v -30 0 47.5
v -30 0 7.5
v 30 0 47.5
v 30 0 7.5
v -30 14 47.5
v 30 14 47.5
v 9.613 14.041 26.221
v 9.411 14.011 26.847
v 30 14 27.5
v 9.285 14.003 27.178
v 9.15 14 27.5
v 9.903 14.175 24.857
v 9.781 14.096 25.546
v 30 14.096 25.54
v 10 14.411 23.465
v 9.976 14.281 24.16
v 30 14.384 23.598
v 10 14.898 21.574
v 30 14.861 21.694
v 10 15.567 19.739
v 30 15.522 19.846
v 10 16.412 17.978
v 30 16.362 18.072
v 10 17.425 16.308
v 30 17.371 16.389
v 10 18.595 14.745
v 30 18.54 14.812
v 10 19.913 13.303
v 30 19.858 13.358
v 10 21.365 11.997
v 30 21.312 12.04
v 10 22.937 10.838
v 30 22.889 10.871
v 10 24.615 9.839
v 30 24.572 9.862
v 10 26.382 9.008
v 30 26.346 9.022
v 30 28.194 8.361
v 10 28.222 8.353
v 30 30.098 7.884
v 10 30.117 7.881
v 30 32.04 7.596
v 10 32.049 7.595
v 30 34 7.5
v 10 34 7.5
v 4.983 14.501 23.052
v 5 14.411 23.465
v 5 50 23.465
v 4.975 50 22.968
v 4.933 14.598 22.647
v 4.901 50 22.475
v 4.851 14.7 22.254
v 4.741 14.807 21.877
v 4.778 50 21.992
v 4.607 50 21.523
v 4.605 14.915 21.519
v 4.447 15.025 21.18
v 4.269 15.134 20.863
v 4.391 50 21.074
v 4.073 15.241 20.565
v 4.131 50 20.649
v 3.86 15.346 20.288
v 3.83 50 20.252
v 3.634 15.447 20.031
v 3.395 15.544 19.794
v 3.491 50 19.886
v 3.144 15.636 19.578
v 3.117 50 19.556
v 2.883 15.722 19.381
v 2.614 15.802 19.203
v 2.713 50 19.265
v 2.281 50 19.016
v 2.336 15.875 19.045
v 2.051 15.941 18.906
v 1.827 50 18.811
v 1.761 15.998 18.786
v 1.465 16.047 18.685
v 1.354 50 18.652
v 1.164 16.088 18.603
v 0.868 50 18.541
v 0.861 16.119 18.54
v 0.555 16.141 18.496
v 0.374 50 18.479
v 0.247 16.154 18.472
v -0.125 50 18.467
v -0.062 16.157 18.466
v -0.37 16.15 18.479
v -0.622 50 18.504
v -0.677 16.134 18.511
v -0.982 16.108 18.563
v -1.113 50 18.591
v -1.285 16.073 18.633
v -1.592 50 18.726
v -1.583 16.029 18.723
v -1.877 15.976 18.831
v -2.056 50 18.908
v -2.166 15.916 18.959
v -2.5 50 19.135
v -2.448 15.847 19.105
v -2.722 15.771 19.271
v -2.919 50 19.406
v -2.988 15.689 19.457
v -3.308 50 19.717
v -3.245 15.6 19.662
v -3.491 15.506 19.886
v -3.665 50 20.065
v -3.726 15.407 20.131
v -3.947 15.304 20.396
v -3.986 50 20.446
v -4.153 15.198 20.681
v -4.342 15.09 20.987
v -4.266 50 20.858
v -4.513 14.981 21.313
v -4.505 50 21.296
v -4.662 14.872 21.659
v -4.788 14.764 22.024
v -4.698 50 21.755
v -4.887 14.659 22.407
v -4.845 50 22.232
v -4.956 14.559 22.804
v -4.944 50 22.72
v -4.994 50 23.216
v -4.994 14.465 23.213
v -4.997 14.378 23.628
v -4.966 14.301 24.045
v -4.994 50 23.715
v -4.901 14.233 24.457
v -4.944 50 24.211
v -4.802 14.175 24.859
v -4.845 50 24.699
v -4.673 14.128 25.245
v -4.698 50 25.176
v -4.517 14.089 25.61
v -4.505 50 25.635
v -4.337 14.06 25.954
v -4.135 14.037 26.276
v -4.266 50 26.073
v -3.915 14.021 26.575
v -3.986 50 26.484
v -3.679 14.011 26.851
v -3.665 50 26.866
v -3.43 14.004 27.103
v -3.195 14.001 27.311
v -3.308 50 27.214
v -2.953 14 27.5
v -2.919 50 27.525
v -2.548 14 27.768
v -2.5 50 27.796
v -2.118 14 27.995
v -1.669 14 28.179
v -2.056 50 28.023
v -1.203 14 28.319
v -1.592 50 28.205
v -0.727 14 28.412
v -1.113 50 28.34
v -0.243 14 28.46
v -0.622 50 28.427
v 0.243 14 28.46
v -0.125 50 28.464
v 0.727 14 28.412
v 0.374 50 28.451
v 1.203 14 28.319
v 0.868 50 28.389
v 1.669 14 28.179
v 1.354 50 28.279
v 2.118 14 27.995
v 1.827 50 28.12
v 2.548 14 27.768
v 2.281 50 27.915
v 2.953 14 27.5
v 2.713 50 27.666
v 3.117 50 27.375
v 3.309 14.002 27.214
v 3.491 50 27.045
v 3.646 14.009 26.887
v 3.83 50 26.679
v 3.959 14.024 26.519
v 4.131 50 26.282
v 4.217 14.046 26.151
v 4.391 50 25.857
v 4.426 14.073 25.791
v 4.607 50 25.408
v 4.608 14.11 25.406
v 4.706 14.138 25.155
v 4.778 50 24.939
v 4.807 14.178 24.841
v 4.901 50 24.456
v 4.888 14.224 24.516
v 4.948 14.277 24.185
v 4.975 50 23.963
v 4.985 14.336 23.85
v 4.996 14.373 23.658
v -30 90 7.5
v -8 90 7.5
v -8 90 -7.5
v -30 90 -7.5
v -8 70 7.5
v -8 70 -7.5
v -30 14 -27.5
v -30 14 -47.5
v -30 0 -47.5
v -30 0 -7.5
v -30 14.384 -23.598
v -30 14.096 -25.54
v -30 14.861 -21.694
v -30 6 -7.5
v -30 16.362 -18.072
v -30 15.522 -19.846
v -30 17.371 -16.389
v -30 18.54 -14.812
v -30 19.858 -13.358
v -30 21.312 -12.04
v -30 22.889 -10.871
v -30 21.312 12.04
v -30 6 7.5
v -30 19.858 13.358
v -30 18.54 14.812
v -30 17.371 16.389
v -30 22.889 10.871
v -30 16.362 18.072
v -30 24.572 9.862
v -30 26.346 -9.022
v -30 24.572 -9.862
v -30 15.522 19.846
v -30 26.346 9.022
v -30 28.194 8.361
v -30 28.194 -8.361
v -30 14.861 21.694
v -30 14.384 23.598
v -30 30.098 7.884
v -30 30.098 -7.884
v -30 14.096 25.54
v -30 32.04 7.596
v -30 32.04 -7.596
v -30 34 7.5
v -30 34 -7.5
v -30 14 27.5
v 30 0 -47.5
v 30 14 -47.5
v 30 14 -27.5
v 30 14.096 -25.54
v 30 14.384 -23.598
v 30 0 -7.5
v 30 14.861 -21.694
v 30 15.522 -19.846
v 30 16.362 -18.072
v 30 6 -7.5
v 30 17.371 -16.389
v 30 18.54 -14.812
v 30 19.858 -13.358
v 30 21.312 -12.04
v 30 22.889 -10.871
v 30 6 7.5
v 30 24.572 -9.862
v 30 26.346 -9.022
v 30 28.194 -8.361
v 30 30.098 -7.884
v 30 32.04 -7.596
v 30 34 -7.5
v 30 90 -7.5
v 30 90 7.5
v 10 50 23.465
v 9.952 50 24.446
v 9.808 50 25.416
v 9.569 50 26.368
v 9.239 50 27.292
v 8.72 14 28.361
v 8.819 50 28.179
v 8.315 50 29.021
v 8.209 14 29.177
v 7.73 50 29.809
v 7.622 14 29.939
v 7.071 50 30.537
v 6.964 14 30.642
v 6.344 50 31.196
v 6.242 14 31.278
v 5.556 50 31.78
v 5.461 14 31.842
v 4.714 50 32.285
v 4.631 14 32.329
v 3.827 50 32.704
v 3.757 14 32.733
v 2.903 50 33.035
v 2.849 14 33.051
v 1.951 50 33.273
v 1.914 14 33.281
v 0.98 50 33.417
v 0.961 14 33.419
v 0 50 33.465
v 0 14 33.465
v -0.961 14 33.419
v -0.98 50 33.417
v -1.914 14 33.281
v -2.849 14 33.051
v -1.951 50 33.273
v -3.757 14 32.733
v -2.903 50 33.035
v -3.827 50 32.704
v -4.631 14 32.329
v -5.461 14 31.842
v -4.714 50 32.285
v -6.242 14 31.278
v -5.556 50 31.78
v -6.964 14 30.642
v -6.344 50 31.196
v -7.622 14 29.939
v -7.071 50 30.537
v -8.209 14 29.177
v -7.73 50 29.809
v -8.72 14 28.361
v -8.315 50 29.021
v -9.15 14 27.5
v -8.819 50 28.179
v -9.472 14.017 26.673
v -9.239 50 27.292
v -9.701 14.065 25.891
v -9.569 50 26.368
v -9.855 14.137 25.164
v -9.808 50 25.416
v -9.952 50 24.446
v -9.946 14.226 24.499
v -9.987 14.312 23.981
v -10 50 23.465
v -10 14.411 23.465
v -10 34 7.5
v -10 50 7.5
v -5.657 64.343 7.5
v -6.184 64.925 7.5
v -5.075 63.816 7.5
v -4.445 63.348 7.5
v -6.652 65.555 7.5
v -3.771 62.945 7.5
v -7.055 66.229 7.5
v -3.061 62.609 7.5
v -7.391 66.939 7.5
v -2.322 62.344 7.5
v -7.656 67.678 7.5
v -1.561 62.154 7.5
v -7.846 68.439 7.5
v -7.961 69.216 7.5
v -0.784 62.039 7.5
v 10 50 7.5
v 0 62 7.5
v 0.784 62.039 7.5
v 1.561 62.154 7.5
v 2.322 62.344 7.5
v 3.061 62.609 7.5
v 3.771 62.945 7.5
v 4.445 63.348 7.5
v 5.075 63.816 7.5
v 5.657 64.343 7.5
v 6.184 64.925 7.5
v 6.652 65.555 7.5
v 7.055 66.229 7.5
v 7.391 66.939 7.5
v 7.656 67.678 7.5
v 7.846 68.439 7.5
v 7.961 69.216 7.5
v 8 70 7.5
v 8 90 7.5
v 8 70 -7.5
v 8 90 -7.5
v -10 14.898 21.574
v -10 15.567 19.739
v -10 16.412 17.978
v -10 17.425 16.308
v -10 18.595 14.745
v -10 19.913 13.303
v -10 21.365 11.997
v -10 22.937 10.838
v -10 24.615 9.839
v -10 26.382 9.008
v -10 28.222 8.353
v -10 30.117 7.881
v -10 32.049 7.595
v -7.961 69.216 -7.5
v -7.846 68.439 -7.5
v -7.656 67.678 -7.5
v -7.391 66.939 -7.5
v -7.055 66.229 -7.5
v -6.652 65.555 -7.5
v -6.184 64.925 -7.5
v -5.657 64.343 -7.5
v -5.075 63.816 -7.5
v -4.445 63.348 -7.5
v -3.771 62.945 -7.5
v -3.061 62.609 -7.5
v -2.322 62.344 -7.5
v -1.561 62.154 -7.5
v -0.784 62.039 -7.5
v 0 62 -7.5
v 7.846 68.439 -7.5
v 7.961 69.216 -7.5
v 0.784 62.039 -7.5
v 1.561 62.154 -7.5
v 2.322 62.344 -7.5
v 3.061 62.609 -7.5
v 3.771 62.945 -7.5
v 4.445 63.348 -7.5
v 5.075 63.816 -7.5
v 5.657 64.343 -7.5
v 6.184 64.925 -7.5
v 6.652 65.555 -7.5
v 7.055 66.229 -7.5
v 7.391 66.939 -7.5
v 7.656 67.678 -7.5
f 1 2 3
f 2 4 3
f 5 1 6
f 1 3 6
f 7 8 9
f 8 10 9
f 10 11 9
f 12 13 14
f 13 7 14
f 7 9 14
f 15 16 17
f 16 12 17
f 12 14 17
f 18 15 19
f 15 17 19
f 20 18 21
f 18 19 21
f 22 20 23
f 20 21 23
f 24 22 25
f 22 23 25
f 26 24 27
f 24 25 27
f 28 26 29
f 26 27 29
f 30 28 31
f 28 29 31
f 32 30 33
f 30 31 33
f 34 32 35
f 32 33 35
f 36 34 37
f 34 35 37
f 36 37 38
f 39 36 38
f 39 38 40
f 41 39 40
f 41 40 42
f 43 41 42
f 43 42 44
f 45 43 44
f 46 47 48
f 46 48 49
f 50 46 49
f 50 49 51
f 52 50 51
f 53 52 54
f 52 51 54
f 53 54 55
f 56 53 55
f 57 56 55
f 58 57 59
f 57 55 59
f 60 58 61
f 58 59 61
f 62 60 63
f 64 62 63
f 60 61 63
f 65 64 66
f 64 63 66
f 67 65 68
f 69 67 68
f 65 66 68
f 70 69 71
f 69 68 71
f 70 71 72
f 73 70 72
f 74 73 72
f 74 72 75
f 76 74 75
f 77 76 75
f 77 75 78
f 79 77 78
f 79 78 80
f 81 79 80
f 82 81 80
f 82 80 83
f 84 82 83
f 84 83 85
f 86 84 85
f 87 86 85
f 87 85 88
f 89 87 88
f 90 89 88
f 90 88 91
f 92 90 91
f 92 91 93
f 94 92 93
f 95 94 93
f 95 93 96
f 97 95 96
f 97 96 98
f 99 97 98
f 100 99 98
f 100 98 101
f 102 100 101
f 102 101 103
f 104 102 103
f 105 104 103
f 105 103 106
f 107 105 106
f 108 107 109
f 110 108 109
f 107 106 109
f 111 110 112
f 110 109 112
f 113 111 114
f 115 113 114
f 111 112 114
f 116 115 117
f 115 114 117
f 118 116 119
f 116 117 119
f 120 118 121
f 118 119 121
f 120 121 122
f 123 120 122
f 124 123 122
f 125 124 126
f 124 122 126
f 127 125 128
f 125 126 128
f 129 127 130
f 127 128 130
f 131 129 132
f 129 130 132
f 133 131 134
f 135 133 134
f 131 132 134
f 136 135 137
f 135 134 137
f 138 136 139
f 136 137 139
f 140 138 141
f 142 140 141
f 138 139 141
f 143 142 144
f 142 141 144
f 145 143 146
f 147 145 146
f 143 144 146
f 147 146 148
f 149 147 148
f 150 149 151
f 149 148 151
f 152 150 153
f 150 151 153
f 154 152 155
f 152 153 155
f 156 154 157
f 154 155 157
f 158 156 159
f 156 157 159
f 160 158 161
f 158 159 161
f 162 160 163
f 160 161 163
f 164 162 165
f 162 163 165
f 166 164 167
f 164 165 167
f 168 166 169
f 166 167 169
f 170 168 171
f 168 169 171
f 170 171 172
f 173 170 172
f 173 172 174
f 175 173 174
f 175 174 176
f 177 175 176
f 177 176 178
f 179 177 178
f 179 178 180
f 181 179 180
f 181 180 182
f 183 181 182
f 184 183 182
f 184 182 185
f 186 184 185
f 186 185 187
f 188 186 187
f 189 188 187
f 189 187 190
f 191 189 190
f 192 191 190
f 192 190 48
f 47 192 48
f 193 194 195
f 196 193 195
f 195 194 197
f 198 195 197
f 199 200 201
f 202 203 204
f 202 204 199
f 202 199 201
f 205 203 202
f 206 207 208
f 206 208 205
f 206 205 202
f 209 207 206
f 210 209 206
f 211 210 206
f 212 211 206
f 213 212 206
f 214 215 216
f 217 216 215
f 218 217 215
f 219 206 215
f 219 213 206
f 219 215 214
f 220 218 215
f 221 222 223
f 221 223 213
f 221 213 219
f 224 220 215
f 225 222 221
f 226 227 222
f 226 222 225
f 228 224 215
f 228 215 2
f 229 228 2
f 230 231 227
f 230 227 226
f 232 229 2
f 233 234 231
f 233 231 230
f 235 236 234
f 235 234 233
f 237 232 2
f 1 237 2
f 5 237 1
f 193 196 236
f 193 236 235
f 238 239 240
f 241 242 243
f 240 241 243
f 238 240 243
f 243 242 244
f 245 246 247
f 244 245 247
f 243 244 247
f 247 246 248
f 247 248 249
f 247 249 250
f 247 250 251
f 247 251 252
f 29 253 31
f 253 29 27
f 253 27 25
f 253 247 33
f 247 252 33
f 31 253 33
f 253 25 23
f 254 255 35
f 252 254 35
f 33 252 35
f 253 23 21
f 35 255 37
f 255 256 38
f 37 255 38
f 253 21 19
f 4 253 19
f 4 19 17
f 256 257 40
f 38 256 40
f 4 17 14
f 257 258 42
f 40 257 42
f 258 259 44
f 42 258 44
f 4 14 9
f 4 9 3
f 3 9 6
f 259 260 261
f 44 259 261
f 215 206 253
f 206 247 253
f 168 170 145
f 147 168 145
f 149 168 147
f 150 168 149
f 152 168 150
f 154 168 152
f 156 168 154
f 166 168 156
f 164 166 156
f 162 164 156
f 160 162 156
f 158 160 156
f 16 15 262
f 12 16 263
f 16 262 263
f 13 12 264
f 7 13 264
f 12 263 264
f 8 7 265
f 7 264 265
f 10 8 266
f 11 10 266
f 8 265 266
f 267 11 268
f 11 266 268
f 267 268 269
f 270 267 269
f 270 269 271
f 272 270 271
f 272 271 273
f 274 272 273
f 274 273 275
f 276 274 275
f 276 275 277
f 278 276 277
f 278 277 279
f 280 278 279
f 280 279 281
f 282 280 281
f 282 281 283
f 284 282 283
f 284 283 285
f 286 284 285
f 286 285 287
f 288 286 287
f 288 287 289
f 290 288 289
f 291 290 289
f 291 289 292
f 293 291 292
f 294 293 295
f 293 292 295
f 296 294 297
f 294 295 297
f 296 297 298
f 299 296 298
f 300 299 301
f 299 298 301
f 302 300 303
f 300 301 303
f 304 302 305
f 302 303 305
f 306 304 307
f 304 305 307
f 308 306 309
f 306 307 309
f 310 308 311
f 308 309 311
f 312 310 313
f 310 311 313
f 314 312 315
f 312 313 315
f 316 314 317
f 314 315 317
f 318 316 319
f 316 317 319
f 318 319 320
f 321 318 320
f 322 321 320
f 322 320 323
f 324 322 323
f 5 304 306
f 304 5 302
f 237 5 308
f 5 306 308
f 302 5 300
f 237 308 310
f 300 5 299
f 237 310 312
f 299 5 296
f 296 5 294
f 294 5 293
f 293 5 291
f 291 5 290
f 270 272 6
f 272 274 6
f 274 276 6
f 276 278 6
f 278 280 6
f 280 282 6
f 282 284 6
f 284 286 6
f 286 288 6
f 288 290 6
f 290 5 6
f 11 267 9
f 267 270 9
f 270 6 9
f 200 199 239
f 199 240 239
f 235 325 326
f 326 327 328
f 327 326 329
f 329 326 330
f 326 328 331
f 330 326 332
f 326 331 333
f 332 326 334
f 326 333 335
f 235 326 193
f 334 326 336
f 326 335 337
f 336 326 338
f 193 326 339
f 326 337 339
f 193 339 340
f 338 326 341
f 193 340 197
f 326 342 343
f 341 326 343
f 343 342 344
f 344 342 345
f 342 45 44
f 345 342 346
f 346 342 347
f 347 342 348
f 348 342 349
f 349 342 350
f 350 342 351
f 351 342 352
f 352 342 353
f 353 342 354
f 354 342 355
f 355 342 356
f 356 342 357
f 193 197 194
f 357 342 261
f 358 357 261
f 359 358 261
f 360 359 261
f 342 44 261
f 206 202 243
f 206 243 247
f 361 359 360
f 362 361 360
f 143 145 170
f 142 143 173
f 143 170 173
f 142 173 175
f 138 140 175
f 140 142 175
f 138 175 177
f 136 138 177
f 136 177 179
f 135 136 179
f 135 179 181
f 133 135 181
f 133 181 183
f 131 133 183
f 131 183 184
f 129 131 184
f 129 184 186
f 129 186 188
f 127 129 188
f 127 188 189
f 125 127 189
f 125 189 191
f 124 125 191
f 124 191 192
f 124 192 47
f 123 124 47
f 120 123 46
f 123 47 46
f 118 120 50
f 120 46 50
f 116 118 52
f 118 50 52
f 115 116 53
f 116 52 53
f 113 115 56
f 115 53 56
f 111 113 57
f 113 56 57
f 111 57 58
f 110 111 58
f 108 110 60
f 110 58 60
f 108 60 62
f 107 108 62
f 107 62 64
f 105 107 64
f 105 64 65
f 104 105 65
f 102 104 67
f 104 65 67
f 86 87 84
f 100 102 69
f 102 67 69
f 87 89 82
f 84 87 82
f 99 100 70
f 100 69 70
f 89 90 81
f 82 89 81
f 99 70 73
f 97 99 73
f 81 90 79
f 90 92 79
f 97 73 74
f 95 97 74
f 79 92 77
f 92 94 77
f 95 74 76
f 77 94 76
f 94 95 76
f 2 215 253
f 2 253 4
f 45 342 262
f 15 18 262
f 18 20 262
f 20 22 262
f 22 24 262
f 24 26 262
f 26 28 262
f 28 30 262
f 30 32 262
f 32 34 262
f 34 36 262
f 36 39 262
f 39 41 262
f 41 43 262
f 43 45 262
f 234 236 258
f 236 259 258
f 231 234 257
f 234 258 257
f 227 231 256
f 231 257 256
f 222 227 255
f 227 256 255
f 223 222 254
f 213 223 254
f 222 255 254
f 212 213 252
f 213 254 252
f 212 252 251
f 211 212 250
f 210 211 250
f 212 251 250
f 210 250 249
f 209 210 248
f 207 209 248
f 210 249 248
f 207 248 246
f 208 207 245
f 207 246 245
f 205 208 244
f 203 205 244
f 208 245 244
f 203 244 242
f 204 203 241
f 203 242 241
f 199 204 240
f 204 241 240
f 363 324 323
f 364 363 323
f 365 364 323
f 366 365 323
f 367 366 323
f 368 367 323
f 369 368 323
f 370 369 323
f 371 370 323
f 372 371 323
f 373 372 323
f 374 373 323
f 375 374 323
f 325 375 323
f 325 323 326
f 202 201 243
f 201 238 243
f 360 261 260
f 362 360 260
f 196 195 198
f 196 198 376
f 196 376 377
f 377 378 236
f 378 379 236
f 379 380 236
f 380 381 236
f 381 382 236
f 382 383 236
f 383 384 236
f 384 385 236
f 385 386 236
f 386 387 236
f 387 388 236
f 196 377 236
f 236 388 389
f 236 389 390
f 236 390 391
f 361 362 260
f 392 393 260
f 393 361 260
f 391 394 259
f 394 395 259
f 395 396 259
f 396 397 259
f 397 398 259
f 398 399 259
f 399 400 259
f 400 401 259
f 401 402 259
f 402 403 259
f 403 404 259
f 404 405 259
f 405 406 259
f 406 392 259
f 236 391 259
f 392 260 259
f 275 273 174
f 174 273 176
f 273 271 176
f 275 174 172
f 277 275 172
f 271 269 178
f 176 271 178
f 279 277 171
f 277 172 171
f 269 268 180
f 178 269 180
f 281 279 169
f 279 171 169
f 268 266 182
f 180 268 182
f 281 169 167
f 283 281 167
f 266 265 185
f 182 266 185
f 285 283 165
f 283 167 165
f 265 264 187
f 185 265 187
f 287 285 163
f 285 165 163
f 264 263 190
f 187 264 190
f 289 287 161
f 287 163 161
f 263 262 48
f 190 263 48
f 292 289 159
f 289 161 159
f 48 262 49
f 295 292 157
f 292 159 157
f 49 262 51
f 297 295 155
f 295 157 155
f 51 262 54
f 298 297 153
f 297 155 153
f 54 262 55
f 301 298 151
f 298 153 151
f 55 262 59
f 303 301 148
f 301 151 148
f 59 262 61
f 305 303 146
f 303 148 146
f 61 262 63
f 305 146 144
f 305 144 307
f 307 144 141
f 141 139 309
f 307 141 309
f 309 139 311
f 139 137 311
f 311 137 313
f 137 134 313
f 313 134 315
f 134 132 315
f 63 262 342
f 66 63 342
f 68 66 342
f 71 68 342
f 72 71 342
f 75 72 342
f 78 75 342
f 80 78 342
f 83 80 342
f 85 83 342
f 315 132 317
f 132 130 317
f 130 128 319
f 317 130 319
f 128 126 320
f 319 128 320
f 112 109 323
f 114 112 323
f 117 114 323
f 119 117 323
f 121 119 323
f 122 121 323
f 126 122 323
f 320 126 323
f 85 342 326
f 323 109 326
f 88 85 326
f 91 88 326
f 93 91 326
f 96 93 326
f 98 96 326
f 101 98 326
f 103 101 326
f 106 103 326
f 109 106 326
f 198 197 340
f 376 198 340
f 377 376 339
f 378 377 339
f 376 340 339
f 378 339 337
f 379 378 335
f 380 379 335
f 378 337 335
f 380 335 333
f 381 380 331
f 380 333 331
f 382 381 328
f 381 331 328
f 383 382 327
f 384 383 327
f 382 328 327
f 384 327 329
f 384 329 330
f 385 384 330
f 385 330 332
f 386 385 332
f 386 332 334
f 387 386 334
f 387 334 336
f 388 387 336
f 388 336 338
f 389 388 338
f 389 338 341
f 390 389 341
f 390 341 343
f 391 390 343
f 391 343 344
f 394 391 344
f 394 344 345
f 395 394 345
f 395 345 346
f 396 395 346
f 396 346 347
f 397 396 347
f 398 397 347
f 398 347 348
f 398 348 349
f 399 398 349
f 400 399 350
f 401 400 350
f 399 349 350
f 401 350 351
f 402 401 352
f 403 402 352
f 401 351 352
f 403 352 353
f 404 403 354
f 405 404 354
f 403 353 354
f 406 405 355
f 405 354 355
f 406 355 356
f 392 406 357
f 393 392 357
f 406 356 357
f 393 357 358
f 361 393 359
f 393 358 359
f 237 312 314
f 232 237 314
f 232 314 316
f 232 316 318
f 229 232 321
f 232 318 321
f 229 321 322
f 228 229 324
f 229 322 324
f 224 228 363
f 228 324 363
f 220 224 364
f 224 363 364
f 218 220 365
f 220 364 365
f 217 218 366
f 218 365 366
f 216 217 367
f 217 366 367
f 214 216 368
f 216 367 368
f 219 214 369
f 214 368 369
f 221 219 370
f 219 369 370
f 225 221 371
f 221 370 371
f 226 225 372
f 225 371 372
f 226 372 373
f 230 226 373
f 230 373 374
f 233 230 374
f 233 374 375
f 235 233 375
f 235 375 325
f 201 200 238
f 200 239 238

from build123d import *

# Parameters (mm, degrees)
BOSS_EXTRUDE1_DEPTH = 30
CUT_EXTRUDE1_DEPTH  = 60
SKETCH6_R           = 5
BOSS_EXTRUDE2_DEPTH = 36


with BuildPart() as part:
    # Sketch4 → Boss-Extrude1 (new body, symmetric)
    with BuildSketch(Plane(origin=(0, 0, 0), x_dir=(0, 0, -1), z_dir=(1, 0, 0))):
        with BuildLine():
            Line((-7.5, 90), (7.5, 90))
            Line((7.5, 90), (7.5, 34))
            ThreePointArc((7.5, 34), (13.357864376, 19.857864376), (27.5, 14))
            Line((27.5, 14), (47.5, 14))
            Line((47.5, 14), (47.5, 0))
            Line((47.5, 0), (7.5, 0))
            Line((7.5, 0), (7.5, 6))
            Line((7.5, 6), (-7.5, 6))
            Line((-7.5, 6), (-7.5, 0))
            Line((-7.5, 0), (-47.5, 0))
            Line((-47.5, 0), (-47.5, 14))
            Line((-47.5, 14), (-27.5, 14))
            ThreePointArc((-27.5, 14), (-13.357864376, 19.857864376), (-7.5, 34))
            Line((-7.5, 34), (-7.5, 90))
        make_face()
    extrude(amount=BOSS_EXTRUDE1_DEPTH, both=True)

    # Sketch5 → Cut-Extrude1 (cut)
    with BuildSketch(Plane.XY.offset(7.5)):
        with BuildLine():
            Line((8, 70), (8, 90))
            Line((8, 90), (-8, 90))
            Line((-8, 90), (-8, 70))
            ThreePointArc((-8, 70), (0, 62), (8, 70))
        make_face()
    extrude(amount=-CUT_EXTRUDE1_DEPTH, mode=Mode.SUBTRACT)

    # Sketch6 → Boss-Extrude2 (add)
    with BuildSketch(Plane(origin=(0, 50, 0), x_dir=(1, 0, 0), z_dir=(0, 1, 0))):
        with BuildLine():
            Line((-10, -23.46544552), (-10, -7.5))
            Line((-10, -7.5), (10, -7.5))
            Line((10, -7.5), (10, -23.46544552))
            ThreePointArc((10, -23.46544552), (0, -33.46544552), (-10, -23.46544552))
        make_face()
        with Locations((0, -23.46544552)):
            Circle(SKETCH6_R, mode=Mode.SUBTRACT)
    extrude(amount=-BOSS_EXTRUDE2_DEPTH)


solid = part.part
